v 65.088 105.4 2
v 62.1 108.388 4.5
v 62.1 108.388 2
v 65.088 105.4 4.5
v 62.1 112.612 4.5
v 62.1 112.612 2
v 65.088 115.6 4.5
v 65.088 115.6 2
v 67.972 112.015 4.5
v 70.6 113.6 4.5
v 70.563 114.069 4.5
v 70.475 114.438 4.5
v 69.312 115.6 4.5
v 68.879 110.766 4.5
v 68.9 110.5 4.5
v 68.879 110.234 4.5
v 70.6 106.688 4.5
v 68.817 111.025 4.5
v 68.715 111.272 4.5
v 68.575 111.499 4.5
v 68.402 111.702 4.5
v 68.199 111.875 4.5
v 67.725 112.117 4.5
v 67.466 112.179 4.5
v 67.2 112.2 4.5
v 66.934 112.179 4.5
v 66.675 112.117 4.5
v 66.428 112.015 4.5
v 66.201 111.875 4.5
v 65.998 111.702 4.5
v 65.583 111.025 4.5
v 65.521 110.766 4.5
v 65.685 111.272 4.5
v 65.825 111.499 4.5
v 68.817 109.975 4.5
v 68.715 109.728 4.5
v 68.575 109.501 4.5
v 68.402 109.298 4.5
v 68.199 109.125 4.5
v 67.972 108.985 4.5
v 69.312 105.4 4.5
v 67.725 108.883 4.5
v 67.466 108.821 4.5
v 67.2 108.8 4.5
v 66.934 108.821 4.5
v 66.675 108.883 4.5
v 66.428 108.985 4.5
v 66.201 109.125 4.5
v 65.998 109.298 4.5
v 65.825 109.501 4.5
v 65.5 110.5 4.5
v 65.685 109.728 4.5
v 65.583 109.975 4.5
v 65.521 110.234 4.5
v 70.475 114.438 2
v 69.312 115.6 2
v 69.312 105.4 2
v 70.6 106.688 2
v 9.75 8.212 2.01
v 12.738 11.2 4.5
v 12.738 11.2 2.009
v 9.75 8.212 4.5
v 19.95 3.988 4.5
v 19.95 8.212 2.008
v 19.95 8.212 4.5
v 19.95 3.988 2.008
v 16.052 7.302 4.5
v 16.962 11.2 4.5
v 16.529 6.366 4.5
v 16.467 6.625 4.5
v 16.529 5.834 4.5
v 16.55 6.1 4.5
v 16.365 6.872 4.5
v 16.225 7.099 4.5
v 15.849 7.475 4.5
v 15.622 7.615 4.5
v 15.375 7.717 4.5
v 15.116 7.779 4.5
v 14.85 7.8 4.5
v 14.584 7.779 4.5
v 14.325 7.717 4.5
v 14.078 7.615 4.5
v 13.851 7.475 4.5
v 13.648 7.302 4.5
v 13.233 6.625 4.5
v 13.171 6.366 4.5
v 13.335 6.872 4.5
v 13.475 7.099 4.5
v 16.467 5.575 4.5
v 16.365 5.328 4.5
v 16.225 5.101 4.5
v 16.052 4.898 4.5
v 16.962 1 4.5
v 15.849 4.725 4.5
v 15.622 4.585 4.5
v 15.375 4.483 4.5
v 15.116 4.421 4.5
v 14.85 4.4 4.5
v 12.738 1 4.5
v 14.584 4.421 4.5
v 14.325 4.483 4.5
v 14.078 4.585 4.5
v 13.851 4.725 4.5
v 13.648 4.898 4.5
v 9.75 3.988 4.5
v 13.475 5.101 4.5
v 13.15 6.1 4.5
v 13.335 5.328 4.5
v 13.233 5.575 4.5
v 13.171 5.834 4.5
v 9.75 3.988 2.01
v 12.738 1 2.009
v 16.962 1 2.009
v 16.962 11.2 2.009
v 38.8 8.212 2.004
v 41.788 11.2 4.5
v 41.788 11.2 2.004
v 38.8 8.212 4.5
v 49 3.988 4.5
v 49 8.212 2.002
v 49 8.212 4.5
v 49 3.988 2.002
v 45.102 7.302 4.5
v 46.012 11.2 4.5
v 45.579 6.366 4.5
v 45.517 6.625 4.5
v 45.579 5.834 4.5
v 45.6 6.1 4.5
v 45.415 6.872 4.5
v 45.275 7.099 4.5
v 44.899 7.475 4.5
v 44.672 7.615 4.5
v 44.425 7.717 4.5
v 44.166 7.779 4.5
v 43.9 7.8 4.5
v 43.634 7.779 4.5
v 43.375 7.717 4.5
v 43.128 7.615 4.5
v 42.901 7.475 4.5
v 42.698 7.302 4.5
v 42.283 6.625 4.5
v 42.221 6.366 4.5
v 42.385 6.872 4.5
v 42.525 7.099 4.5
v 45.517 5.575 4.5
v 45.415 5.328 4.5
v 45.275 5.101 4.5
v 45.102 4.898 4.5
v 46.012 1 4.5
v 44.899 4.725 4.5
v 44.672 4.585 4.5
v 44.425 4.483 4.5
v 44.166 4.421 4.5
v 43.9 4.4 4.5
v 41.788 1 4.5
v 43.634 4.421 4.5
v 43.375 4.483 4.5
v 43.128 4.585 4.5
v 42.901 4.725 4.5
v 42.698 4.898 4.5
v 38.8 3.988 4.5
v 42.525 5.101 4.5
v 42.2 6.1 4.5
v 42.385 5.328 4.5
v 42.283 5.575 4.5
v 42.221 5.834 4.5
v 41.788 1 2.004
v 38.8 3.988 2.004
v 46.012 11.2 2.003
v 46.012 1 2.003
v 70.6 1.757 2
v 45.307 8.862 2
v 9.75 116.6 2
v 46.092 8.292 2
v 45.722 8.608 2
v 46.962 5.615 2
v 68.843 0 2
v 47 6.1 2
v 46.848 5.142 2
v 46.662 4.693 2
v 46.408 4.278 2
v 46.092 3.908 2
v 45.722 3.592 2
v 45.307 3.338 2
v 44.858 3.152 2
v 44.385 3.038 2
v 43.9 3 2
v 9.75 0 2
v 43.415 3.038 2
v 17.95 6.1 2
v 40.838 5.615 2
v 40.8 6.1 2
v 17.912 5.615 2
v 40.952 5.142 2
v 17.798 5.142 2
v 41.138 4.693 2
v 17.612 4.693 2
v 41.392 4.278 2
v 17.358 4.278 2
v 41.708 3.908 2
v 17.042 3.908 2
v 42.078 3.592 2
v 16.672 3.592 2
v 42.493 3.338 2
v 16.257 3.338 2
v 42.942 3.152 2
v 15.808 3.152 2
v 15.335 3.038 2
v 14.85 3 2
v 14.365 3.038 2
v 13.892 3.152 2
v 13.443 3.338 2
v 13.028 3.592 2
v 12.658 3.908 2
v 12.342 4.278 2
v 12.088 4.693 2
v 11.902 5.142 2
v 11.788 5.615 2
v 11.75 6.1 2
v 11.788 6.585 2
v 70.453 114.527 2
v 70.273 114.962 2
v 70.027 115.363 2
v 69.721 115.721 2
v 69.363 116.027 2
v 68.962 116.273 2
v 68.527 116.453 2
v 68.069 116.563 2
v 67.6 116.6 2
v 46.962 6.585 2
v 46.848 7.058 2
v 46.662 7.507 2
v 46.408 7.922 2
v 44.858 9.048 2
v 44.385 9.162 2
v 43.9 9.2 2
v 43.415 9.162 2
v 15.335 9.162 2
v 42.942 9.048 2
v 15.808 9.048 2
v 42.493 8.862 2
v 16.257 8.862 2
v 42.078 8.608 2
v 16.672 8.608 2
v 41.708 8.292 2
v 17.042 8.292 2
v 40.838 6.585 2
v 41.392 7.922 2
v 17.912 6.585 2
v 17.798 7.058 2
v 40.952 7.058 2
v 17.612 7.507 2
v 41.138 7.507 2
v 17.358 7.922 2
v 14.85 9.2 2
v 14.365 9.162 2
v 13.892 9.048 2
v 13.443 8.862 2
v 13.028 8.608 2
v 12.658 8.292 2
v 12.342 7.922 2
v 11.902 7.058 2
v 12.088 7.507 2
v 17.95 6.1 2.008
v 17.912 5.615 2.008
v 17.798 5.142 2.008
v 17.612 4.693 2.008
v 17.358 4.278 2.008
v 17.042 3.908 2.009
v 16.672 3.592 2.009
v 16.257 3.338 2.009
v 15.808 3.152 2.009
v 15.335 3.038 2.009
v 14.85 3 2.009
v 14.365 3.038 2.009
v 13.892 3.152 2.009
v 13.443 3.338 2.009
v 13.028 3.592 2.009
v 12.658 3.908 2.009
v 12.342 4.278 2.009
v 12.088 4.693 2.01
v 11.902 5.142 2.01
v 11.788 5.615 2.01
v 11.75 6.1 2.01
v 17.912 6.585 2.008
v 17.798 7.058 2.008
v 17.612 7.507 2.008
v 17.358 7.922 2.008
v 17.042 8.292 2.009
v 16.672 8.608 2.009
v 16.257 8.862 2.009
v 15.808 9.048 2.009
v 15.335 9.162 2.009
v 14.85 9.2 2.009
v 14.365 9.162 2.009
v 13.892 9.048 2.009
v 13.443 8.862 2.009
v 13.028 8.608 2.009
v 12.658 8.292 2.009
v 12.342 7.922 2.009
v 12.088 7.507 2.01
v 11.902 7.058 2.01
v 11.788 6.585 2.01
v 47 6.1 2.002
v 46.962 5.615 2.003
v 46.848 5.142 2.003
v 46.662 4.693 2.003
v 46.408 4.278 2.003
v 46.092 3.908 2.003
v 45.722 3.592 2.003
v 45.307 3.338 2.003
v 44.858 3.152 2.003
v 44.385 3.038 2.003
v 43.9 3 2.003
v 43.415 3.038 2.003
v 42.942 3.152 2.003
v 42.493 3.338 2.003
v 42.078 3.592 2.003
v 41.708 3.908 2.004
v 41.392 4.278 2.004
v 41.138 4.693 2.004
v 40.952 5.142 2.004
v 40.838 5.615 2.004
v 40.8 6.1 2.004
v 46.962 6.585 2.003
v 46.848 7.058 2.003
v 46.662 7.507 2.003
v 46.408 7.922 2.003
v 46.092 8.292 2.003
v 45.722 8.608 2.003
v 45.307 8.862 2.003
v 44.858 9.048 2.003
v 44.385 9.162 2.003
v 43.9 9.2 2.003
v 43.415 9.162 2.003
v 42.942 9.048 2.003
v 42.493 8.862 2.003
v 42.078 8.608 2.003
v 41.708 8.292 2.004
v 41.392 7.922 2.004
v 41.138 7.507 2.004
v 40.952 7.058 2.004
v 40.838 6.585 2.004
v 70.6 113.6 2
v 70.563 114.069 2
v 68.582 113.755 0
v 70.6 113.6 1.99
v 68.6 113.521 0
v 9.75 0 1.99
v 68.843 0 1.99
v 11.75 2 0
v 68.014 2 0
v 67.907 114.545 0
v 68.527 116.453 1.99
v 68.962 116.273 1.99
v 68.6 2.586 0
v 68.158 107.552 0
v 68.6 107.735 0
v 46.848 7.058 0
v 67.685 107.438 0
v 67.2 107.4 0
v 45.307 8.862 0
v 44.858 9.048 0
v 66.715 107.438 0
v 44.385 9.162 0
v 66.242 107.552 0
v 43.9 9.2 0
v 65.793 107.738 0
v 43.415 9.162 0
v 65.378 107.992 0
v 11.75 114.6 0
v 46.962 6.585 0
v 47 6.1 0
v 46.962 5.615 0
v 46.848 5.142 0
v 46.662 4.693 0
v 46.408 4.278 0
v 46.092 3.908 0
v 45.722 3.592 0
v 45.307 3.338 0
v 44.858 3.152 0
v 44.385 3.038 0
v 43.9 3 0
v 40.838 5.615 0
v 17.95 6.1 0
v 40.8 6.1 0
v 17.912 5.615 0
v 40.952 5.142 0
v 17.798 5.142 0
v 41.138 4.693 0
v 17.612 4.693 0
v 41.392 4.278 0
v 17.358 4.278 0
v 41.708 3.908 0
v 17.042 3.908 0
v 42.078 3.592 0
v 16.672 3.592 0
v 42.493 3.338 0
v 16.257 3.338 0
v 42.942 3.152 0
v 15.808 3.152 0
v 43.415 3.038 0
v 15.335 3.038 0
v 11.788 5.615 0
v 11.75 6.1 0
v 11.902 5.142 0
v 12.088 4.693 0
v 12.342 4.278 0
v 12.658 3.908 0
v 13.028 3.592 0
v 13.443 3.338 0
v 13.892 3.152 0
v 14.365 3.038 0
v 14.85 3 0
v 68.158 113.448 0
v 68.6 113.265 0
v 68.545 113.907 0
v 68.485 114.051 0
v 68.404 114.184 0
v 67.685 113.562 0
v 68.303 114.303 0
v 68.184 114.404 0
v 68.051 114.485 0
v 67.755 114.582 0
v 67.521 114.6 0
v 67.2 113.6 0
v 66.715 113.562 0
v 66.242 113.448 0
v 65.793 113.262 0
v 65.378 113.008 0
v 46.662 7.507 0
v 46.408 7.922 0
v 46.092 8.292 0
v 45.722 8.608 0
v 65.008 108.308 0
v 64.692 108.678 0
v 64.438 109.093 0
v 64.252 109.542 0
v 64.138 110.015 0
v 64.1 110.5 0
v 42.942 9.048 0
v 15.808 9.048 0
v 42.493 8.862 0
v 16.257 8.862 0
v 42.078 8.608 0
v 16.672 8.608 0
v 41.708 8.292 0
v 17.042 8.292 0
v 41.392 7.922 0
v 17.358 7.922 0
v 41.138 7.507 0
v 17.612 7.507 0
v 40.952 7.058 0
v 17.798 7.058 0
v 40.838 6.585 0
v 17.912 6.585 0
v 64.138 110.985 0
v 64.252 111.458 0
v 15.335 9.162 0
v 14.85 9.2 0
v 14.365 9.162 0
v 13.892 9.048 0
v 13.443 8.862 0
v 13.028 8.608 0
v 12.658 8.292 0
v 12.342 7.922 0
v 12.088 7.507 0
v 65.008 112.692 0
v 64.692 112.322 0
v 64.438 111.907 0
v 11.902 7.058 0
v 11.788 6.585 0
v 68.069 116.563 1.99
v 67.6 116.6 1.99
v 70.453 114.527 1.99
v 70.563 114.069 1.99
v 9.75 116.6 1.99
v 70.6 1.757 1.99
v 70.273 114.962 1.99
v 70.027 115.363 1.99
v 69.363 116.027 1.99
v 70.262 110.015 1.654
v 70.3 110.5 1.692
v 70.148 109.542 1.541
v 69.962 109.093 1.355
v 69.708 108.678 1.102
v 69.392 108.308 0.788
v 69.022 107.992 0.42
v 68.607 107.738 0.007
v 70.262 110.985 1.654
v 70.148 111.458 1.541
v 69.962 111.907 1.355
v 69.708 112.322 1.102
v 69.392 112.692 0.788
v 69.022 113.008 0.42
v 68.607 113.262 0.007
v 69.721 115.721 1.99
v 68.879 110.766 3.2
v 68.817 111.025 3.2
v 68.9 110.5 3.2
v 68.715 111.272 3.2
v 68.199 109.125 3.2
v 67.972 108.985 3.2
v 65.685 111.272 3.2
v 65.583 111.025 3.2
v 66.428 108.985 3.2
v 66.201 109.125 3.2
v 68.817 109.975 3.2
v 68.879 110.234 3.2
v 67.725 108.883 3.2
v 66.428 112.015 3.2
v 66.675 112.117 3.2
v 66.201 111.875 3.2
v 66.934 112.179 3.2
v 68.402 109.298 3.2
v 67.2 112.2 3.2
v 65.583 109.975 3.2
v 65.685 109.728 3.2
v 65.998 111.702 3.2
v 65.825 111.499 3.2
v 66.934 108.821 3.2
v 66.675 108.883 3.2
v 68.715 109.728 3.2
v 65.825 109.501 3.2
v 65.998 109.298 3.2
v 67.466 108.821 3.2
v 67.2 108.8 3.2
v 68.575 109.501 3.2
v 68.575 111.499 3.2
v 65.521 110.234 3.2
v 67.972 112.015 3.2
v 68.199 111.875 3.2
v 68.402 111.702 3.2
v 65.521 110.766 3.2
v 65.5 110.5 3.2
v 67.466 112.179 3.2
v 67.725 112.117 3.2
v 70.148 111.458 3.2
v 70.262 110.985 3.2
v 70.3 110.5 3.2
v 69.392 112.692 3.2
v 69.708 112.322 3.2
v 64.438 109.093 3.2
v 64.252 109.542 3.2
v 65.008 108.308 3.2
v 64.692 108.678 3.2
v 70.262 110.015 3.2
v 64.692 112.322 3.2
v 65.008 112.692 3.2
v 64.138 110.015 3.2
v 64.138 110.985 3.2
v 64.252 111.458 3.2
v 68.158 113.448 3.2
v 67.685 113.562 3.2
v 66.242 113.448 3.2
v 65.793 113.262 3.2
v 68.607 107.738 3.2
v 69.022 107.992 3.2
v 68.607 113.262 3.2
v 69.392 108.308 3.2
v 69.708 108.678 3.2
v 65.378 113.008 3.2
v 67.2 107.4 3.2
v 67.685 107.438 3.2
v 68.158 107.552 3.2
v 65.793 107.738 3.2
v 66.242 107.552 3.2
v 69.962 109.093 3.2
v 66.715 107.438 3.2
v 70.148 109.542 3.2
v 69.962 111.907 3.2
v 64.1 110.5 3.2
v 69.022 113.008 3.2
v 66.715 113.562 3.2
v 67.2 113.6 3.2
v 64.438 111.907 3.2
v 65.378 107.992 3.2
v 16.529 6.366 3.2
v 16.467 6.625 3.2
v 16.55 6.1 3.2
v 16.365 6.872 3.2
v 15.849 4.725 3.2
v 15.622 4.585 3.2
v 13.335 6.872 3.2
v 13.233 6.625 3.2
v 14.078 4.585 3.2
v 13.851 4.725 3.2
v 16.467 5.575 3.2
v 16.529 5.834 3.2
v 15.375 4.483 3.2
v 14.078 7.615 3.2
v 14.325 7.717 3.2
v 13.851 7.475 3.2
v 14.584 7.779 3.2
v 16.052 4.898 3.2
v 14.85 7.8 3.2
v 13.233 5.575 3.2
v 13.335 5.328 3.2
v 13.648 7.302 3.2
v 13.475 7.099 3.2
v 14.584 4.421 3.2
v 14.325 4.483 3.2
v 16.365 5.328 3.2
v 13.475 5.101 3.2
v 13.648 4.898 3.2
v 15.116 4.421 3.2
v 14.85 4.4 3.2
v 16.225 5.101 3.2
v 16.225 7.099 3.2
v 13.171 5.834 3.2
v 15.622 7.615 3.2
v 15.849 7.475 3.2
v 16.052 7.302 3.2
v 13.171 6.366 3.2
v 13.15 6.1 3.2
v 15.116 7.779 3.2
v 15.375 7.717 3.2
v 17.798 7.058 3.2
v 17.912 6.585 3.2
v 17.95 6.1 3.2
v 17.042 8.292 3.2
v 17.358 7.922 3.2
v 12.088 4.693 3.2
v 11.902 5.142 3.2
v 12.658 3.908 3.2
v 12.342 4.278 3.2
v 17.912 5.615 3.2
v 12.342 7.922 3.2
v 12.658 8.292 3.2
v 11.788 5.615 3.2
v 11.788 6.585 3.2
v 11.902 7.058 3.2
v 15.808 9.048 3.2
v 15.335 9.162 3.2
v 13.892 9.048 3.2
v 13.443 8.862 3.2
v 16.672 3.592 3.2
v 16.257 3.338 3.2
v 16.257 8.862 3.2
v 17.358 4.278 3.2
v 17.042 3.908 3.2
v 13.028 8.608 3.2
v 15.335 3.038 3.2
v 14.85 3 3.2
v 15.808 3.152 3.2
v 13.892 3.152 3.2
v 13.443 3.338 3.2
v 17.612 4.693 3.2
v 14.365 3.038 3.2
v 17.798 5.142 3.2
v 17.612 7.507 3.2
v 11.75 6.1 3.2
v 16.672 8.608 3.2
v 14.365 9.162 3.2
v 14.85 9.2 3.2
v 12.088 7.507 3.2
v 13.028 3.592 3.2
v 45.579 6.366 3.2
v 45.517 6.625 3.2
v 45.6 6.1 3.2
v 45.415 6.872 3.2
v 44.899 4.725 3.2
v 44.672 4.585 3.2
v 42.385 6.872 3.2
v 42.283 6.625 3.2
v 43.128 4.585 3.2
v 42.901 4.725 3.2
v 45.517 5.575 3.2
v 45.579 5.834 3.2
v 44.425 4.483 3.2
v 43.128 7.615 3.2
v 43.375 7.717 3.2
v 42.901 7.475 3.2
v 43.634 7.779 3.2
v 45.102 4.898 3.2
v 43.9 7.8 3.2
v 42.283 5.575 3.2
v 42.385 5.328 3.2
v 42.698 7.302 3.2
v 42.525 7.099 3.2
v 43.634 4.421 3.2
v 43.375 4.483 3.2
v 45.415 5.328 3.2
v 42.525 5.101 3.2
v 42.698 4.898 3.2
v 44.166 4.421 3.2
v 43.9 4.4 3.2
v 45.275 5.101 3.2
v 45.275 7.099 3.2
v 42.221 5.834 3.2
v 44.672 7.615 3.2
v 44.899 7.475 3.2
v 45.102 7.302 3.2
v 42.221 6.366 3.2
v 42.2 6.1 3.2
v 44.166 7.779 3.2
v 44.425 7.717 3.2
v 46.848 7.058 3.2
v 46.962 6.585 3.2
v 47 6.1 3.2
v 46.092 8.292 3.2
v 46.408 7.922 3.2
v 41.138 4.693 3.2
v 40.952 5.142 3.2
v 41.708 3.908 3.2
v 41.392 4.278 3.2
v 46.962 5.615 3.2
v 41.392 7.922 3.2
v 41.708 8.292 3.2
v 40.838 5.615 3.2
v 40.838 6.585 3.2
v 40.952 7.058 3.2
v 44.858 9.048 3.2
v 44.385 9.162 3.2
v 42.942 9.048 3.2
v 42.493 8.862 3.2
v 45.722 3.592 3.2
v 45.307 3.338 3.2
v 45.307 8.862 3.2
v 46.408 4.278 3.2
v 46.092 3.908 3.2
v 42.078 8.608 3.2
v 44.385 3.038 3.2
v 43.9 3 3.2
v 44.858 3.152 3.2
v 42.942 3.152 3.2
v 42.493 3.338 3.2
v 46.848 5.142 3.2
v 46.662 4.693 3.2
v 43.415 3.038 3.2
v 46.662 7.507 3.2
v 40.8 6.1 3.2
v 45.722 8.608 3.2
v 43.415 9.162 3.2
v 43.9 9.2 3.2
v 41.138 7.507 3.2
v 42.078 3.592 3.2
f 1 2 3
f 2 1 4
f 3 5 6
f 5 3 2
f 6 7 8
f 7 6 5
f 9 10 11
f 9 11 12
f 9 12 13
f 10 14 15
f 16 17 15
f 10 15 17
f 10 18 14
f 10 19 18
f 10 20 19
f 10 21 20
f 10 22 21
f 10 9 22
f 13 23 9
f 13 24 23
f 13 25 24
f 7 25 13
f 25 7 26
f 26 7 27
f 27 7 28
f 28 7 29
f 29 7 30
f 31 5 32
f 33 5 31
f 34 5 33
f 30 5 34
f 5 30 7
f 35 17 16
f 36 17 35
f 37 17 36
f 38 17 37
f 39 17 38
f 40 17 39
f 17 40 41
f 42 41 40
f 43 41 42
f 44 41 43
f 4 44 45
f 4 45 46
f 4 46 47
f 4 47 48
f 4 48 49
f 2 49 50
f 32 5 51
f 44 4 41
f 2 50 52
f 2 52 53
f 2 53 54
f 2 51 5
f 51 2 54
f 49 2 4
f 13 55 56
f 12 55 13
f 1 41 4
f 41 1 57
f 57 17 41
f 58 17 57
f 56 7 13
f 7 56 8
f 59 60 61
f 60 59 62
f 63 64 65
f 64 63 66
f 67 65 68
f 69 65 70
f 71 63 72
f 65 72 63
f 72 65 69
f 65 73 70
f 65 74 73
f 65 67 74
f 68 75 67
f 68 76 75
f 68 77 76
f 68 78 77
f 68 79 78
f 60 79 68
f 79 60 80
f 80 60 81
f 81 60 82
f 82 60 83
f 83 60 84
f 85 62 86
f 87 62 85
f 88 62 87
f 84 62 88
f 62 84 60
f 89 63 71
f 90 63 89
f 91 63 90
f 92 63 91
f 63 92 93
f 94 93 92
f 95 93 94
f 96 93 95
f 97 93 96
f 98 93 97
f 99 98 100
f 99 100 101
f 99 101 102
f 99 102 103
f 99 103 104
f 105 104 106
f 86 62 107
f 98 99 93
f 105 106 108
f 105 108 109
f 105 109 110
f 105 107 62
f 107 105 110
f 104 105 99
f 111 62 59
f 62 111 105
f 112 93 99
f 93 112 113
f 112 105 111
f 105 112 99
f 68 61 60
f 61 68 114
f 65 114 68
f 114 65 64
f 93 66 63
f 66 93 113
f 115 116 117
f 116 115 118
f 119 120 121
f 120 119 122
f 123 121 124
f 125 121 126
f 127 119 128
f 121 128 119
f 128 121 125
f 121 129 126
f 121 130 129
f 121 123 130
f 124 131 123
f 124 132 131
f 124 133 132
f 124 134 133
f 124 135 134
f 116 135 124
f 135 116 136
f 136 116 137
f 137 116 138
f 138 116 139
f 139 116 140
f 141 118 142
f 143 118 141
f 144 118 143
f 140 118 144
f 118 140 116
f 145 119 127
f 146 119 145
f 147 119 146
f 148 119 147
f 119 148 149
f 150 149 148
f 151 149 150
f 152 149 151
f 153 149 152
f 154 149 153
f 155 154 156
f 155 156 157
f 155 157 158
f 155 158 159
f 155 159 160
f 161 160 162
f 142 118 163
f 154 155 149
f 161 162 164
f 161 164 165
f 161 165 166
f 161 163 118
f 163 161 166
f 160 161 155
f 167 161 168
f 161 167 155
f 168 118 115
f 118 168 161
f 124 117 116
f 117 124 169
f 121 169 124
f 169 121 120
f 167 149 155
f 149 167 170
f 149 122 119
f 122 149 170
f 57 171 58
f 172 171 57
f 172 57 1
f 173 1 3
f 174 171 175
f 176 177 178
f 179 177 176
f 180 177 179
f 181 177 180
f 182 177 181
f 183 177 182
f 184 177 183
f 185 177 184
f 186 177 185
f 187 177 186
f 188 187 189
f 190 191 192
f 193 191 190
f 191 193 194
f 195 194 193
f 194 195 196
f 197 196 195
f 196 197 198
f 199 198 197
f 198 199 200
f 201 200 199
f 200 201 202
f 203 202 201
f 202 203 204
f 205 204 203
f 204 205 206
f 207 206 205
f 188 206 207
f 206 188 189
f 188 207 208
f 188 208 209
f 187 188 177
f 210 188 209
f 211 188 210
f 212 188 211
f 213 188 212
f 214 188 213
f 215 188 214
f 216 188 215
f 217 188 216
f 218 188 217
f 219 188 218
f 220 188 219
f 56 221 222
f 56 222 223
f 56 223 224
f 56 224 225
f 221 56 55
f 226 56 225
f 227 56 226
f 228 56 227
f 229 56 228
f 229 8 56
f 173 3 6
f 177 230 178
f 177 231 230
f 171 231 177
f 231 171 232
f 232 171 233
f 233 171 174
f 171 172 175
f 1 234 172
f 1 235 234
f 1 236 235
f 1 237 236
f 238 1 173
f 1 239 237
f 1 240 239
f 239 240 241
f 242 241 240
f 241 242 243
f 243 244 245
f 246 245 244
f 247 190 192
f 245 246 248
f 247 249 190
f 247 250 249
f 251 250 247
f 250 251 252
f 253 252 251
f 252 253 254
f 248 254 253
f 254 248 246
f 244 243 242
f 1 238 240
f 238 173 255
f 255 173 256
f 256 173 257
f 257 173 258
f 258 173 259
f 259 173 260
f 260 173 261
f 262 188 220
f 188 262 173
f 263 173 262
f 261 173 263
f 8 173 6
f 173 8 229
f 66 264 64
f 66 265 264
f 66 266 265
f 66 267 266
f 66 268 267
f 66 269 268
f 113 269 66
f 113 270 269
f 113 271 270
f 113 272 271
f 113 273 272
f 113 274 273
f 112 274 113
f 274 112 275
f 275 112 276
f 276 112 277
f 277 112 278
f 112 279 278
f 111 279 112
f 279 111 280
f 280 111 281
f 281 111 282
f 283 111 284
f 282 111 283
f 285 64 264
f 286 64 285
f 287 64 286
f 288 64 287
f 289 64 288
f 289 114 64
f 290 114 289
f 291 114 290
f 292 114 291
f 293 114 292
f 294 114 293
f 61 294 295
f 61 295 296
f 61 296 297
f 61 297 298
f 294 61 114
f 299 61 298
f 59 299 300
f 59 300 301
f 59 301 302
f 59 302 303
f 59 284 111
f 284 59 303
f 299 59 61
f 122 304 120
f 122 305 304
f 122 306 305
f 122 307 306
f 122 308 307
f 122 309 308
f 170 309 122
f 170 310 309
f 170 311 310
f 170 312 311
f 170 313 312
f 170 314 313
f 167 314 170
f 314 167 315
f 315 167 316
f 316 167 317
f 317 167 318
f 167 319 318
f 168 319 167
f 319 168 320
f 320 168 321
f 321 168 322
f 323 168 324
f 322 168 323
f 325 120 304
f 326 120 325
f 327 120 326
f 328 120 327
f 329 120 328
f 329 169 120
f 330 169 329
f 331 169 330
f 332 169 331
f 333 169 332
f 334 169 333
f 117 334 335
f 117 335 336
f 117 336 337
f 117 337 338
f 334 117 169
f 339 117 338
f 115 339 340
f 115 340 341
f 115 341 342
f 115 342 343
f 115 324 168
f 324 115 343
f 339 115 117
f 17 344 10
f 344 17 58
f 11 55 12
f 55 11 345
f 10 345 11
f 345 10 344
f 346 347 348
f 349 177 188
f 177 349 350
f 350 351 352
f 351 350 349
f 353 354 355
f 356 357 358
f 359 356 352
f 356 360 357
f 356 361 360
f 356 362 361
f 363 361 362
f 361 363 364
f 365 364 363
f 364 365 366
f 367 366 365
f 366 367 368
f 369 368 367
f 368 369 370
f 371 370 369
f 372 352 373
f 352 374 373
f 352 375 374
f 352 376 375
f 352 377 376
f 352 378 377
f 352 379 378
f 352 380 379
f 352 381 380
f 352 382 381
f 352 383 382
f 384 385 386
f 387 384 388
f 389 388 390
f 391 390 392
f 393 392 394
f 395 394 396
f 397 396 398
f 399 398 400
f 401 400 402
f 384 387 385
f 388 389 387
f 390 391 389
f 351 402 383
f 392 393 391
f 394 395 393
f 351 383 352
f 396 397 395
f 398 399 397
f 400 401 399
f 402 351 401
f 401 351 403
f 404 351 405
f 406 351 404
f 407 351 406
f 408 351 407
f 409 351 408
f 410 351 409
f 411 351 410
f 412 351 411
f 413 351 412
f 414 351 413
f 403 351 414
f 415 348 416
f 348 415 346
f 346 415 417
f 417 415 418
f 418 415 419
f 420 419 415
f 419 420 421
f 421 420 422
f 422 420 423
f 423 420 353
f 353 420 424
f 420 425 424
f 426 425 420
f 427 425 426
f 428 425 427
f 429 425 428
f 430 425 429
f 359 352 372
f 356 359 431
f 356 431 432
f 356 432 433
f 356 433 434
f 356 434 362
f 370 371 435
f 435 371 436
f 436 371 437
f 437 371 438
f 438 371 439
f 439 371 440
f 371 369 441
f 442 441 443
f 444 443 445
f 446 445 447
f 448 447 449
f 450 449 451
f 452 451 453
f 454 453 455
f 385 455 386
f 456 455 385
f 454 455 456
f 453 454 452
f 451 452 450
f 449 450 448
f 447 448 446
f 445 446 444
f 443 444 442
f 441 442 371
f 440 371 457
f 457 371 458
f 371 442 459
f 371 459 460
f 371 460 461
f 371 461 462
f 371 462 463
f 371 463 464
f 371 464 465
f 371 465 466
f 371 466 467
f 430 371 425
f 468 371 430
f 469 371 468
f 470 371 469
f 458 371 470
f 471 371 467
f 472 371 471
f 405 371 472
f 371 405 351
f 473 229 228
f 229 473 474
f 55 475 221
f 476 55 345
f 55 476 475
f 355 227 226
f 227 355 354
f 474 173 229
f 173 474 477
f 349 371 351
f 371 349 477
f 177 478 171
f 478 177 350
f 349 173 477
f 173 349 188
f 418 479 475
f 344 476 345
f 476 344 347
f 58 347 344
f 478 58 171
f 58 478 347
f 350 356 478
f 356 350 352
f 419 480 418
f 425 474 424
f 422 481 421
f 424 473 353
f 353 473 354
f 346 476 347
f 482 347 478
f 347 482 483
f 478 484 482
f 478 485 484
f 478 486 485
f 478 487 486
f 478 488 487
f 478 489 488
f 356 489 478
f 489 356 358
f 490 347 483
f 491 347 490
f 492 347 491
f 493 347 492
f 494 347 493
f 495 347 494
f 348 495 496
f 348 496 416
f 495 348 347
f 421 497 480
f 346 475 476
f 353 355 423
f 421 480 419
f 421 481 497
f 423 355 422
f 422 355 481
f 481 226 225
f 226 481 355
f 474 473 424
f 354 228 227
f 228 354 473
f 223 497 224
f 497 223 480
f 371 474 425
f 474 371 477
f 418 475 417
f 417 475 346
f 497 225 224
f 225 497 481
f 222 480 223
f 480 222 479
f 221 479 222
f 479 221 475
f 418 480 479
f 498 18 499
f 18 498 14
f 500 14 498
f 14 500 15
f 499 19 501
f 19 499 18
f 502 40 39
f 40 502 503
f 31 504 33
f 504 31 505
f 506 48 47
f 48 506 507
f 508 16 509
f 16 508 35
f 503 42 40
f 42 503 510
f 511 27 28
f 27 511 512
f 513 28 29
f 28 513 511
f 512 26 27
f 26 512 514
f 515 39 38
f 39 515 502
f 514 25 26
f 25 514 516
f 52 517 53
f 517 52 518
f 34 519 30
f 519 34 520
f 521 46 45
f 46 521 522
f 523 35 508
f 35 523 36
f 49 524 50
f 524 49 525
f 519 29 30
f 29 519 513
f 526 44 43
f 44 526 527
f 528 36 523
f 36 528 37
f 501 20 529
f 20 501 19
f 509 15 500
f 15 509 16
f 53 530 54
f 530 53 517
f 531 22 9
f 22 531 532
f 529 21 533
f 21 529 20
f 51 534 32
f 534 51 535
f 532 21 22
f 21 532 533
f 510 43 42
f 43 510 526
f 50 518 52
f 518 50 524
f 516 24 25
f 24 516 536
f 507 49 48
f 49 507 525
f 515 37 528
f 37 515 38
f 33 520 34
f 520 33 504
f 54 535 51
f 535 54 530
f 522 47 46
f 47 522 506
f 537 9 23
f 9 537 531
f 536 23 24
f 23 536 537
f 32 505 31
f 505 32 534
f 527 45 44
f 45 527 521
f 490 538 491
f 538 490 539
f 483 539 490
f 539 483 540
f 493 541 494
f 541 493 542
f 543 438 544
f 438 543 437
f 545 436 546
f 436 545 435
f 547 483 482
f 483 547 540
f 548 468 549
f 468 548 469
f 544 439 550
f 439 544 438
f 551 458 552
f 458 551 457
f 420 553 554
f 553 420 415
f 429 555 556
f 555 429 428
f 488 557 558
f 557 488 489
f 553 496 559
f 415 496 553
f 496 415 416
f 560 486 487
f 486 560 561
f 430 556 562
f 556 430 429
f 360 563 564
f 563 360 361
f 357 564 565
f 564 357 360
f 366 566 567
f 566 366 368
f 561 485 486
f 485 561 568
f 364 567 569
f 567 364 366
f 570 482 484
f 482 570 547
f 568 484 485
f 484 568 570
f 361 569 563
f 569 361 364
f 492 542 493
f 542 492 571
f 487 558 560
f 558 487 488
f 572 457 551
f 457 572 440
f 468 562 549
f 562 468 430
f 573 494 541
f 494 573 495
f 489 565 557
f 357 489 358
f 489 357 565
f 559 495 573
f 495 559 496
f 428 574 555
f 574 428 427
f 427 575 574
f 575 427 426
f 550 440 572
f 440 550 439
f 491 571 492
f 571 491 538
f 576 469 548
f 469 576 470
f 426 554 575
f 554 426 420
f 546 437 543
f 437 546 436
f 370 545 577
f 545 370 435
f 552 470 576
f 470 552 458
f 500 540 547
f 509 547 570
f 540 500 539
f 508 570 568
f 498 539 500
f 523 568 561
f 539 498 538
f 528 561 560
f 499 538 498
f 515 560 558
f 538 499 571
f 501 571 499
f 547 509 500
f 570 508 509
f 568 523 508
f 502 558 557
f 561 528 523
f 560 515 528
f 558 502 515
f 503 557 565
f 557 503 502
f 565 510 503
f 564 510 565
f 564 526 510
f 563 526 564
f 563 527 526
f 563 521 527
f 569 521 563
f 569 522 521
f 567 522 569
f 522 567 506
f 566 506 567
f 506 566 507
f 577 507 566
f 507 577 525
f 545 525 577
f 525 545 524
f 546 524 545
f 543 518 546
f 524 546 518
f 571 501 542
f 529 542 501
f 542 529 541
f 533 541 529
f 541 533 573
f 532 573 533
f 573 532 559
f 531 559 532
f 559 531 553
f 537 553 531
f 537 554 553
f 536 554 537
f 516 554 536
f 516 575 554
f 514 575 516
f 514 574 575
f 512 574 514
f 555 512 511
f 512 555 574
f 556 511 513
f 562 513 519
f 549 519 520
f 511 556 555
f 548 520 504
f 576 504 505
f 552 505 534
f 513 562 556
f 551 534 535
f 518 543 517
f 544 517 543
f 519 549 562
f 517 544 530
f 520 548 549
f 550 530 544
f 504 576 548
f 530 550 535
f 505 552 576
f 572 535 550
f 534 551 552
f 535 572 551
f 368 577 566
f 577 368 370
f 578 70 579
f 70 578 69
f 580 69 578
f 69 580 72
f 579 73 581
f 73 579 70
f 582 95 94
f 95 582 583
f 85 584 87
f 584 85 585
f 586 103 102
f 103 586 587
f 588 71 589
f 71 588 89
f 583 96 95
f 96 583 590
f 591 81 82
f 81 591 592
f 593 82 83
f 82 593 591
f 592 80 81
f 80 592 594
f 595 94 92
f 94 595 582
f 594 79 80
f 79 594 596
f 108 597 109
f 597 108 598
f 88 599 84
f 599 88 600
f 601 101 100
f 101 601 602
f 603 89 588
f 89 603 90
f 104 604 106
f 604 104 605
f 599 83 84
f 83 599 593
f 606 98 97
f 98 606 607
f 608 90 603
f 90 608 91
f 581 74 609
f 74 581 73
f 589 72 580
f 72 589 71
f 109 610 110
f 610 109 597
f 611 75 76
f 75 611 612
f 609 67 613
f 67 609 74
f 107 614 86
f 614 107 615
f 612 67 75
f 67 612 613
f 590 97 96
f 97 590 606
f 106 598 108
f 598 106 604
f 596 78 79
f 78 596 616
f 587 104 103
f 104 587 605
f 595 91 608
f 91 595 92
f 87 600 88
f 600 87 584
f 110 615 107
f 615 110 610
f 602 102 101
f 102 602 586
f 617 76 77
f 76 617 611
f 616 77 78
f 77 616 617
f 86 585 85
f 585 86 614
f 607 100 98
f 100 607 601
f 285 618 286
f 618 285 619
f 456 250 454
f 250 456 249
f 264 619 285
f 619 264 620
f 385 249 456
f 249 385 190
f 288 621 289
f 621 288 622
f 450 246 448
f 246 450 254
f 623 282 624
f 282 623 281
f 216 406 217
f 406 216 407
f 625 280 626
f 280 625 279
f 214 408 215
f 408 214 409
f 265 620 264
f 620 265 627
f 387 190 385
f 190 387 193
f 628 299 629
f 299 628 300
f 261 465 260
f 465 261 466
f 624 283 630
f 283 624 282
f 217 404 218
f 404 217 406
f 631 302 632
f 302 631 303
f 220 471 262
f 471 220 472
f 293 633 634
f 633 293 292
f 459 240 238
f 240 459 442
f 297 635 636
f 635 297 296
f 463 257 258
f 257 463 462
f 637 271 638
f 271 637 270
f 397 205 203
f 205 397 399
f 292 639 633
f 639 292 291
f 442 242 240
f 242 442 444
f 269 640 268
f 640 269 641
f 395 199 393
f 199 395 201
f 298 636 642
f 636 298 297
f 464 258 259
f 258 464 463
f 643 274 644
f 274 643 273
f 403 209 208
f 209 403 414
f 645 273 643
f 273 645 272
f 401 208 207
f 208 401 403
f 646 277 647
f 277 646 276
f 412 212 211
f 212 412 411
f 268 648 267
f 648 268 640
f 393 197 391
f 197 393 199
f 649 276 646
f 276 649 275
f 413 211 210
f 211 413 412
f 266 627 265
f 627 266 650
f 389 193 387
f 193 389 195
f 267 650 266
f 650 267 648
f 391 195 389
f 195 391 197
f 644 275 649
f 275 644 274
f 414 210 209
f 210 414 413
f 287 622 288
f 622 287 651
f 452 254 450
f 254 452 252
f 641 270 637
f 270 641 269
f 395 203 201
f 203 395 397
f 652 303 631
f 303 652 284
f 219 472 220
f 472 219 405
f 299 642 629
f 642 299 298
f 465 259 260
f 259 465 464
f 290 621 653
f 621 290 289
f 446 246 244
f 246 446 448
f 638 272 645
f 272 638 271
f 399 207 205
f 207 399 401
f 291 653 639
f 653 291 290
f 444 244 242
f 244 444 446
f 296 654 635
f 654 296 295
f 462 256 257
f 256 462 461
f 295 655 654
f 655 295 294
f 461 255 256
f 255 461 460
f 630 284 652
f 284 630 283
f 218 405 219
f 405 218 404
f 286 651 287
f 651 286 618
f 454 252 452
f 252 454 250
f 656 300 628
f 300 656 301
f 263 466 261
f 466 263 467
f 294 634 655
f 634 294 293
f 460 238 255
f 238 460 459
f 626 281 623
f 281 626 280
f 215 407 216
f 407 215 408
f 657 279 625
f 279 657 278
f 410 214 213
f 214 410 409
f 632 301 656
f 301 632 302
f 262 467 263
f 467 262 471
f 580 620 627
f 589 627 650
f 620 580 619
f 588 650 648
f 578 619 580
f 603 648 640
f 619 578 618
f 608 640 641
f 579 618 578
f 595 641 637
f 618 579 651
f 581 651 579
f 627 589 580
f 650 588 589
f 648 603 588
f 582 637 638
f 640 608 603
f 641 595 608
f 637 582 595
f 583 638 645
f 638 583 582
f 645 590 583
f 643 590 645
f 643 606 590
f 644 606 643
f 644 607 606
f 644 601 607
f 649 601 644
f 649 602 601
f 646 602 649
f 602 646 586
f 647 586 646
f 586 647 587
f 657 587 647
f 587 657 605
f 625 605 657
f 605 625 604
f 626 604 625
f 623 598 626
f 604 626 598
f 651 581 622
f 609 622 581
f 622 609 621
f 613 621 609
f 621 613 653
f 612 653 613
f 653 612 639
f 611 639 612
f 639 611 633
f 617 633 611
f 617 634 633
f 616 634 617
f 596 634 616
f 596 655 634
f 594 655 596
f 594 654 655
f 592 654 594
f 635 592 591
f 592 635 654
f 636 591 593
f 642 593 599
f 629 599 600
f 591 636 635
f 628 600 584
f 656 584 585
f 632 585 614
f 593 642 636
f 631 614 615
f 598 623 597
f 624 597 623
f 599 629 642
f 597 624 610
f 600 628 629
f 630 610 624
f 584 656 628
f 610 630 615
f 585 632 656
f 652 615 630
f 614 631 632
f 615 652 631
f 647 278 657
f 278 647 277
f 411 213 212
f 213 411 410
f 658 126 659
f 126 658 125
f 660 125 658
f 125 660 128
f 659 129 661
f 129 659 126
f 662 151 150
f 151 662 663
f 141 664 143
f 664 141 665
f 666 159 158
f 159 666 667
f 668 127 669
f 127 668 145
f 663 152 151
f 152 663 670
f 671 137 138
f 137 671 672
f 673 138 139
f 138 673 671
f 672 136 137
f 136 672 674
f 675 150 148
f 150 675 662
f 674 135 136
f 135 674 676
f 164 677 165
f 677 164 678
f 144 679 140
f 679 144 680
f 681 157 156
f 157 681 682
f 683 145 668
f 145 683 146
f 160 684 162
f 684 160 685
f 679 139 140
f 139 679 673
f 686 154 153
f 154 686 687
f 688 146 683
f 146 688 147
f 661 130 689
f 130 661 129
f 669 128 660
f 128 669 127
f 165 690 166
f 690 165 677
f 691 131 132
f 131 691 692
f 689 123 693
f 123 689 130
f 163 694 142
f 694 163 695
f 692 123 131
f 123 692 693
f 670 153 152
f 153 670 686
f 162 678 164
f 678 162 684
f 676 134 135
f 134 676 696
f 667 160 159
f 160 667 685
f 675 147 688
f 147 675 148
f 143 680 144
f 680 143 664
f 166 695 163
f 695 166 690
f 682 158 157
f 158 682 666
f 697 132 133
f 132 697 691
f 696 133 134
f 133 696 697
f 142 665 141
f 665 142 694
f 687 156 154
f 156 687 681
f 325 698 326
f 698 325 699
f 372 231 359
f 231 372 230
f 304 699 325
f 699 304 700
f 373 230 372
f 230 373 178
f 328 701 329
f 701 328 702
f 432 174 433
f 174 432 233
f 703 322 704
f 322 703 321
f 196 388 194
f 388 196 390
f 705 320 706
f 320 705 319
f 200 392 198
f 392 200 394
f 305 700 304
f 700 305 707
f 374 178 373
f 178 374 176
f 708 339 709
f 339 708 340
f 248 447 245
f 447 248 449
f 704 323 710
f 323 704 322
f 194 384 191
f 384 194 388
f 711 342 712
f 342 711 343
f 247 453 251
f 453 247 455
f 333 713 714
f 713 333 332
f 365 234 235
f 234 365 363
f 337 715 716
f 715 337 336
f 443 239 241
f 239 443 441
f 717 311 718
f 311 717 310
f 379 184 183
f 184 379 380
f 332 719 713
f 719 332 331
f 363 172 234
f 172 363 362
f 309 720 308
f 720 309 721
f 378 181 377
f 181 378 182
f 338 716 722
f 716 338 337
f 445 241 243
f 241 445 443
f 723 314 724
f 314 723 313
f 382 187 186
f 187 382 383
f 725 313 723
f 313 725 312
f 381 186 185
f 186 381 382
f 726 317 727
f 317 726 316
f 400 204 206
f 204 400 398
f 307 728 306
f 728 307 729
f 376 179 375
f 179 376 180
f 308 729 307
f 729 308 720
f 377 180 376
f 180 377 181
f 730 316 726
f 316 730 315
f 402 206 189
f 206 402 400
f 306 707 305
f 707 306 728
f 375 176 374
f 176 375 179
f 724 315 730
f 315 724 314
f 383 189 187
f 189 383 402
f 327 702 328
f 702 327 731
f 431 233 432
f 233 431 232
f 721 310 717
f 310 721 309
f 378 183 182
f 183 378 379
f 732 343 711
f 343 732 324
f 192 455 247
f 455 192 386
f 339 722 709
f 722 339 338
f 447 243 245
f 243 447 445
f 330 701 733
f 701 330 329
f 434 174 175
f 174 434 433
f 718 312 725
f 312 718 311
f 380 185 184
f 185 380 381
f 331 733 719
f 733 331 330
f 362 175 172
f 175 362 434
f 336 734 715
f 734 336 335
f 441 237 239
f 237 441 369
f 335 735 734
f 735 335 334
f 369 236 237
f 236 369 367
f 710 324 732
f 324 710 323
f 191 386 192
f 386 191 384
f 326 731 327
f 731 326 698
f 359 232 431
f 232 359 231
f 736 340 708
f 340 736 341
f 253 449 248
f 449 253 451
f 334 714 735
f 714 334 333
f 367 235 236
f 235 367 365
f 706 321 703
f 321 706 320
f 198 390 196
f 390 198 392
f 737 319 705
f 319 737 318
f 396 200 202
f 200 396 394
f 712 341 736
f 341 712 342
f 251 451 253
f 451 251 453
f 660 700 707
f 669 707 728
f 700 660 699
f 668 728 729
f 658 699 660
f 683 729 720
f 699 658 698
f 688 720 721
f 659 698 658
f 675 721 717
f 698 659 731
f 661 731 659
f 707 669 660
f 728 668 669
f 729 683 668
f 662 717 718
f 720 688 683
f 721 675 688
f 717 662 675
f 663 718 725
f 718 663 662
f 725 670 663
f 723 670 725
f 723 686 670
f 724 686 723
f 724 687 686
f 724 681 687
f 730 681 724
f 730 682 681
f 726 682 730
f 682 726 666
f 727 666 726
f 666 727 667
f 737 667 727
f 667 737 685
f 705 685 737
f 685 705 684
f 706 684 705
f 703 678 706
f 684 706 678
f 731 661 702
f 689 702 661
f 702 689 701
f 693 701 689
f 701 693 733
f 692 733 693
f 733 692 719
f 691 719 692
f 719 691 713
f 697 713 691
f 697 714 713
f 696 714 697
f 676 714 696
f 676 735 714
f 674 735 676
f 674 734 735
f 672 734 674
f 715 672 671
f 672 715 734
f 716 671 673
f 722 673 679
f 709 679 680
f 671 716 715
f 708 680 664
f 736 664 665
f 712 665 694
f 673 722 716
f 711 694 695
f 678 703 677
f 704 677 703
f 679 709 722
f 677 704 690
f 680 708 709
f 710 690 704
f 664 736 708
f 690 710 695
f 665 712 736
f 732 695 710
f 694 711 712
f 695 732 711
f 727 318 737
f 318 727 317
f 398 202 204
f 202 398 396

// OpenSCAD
include <../lib/kobo-meshcore-case-lib.scad>;
$fn = 40;
color("#e8a33d") cover();
